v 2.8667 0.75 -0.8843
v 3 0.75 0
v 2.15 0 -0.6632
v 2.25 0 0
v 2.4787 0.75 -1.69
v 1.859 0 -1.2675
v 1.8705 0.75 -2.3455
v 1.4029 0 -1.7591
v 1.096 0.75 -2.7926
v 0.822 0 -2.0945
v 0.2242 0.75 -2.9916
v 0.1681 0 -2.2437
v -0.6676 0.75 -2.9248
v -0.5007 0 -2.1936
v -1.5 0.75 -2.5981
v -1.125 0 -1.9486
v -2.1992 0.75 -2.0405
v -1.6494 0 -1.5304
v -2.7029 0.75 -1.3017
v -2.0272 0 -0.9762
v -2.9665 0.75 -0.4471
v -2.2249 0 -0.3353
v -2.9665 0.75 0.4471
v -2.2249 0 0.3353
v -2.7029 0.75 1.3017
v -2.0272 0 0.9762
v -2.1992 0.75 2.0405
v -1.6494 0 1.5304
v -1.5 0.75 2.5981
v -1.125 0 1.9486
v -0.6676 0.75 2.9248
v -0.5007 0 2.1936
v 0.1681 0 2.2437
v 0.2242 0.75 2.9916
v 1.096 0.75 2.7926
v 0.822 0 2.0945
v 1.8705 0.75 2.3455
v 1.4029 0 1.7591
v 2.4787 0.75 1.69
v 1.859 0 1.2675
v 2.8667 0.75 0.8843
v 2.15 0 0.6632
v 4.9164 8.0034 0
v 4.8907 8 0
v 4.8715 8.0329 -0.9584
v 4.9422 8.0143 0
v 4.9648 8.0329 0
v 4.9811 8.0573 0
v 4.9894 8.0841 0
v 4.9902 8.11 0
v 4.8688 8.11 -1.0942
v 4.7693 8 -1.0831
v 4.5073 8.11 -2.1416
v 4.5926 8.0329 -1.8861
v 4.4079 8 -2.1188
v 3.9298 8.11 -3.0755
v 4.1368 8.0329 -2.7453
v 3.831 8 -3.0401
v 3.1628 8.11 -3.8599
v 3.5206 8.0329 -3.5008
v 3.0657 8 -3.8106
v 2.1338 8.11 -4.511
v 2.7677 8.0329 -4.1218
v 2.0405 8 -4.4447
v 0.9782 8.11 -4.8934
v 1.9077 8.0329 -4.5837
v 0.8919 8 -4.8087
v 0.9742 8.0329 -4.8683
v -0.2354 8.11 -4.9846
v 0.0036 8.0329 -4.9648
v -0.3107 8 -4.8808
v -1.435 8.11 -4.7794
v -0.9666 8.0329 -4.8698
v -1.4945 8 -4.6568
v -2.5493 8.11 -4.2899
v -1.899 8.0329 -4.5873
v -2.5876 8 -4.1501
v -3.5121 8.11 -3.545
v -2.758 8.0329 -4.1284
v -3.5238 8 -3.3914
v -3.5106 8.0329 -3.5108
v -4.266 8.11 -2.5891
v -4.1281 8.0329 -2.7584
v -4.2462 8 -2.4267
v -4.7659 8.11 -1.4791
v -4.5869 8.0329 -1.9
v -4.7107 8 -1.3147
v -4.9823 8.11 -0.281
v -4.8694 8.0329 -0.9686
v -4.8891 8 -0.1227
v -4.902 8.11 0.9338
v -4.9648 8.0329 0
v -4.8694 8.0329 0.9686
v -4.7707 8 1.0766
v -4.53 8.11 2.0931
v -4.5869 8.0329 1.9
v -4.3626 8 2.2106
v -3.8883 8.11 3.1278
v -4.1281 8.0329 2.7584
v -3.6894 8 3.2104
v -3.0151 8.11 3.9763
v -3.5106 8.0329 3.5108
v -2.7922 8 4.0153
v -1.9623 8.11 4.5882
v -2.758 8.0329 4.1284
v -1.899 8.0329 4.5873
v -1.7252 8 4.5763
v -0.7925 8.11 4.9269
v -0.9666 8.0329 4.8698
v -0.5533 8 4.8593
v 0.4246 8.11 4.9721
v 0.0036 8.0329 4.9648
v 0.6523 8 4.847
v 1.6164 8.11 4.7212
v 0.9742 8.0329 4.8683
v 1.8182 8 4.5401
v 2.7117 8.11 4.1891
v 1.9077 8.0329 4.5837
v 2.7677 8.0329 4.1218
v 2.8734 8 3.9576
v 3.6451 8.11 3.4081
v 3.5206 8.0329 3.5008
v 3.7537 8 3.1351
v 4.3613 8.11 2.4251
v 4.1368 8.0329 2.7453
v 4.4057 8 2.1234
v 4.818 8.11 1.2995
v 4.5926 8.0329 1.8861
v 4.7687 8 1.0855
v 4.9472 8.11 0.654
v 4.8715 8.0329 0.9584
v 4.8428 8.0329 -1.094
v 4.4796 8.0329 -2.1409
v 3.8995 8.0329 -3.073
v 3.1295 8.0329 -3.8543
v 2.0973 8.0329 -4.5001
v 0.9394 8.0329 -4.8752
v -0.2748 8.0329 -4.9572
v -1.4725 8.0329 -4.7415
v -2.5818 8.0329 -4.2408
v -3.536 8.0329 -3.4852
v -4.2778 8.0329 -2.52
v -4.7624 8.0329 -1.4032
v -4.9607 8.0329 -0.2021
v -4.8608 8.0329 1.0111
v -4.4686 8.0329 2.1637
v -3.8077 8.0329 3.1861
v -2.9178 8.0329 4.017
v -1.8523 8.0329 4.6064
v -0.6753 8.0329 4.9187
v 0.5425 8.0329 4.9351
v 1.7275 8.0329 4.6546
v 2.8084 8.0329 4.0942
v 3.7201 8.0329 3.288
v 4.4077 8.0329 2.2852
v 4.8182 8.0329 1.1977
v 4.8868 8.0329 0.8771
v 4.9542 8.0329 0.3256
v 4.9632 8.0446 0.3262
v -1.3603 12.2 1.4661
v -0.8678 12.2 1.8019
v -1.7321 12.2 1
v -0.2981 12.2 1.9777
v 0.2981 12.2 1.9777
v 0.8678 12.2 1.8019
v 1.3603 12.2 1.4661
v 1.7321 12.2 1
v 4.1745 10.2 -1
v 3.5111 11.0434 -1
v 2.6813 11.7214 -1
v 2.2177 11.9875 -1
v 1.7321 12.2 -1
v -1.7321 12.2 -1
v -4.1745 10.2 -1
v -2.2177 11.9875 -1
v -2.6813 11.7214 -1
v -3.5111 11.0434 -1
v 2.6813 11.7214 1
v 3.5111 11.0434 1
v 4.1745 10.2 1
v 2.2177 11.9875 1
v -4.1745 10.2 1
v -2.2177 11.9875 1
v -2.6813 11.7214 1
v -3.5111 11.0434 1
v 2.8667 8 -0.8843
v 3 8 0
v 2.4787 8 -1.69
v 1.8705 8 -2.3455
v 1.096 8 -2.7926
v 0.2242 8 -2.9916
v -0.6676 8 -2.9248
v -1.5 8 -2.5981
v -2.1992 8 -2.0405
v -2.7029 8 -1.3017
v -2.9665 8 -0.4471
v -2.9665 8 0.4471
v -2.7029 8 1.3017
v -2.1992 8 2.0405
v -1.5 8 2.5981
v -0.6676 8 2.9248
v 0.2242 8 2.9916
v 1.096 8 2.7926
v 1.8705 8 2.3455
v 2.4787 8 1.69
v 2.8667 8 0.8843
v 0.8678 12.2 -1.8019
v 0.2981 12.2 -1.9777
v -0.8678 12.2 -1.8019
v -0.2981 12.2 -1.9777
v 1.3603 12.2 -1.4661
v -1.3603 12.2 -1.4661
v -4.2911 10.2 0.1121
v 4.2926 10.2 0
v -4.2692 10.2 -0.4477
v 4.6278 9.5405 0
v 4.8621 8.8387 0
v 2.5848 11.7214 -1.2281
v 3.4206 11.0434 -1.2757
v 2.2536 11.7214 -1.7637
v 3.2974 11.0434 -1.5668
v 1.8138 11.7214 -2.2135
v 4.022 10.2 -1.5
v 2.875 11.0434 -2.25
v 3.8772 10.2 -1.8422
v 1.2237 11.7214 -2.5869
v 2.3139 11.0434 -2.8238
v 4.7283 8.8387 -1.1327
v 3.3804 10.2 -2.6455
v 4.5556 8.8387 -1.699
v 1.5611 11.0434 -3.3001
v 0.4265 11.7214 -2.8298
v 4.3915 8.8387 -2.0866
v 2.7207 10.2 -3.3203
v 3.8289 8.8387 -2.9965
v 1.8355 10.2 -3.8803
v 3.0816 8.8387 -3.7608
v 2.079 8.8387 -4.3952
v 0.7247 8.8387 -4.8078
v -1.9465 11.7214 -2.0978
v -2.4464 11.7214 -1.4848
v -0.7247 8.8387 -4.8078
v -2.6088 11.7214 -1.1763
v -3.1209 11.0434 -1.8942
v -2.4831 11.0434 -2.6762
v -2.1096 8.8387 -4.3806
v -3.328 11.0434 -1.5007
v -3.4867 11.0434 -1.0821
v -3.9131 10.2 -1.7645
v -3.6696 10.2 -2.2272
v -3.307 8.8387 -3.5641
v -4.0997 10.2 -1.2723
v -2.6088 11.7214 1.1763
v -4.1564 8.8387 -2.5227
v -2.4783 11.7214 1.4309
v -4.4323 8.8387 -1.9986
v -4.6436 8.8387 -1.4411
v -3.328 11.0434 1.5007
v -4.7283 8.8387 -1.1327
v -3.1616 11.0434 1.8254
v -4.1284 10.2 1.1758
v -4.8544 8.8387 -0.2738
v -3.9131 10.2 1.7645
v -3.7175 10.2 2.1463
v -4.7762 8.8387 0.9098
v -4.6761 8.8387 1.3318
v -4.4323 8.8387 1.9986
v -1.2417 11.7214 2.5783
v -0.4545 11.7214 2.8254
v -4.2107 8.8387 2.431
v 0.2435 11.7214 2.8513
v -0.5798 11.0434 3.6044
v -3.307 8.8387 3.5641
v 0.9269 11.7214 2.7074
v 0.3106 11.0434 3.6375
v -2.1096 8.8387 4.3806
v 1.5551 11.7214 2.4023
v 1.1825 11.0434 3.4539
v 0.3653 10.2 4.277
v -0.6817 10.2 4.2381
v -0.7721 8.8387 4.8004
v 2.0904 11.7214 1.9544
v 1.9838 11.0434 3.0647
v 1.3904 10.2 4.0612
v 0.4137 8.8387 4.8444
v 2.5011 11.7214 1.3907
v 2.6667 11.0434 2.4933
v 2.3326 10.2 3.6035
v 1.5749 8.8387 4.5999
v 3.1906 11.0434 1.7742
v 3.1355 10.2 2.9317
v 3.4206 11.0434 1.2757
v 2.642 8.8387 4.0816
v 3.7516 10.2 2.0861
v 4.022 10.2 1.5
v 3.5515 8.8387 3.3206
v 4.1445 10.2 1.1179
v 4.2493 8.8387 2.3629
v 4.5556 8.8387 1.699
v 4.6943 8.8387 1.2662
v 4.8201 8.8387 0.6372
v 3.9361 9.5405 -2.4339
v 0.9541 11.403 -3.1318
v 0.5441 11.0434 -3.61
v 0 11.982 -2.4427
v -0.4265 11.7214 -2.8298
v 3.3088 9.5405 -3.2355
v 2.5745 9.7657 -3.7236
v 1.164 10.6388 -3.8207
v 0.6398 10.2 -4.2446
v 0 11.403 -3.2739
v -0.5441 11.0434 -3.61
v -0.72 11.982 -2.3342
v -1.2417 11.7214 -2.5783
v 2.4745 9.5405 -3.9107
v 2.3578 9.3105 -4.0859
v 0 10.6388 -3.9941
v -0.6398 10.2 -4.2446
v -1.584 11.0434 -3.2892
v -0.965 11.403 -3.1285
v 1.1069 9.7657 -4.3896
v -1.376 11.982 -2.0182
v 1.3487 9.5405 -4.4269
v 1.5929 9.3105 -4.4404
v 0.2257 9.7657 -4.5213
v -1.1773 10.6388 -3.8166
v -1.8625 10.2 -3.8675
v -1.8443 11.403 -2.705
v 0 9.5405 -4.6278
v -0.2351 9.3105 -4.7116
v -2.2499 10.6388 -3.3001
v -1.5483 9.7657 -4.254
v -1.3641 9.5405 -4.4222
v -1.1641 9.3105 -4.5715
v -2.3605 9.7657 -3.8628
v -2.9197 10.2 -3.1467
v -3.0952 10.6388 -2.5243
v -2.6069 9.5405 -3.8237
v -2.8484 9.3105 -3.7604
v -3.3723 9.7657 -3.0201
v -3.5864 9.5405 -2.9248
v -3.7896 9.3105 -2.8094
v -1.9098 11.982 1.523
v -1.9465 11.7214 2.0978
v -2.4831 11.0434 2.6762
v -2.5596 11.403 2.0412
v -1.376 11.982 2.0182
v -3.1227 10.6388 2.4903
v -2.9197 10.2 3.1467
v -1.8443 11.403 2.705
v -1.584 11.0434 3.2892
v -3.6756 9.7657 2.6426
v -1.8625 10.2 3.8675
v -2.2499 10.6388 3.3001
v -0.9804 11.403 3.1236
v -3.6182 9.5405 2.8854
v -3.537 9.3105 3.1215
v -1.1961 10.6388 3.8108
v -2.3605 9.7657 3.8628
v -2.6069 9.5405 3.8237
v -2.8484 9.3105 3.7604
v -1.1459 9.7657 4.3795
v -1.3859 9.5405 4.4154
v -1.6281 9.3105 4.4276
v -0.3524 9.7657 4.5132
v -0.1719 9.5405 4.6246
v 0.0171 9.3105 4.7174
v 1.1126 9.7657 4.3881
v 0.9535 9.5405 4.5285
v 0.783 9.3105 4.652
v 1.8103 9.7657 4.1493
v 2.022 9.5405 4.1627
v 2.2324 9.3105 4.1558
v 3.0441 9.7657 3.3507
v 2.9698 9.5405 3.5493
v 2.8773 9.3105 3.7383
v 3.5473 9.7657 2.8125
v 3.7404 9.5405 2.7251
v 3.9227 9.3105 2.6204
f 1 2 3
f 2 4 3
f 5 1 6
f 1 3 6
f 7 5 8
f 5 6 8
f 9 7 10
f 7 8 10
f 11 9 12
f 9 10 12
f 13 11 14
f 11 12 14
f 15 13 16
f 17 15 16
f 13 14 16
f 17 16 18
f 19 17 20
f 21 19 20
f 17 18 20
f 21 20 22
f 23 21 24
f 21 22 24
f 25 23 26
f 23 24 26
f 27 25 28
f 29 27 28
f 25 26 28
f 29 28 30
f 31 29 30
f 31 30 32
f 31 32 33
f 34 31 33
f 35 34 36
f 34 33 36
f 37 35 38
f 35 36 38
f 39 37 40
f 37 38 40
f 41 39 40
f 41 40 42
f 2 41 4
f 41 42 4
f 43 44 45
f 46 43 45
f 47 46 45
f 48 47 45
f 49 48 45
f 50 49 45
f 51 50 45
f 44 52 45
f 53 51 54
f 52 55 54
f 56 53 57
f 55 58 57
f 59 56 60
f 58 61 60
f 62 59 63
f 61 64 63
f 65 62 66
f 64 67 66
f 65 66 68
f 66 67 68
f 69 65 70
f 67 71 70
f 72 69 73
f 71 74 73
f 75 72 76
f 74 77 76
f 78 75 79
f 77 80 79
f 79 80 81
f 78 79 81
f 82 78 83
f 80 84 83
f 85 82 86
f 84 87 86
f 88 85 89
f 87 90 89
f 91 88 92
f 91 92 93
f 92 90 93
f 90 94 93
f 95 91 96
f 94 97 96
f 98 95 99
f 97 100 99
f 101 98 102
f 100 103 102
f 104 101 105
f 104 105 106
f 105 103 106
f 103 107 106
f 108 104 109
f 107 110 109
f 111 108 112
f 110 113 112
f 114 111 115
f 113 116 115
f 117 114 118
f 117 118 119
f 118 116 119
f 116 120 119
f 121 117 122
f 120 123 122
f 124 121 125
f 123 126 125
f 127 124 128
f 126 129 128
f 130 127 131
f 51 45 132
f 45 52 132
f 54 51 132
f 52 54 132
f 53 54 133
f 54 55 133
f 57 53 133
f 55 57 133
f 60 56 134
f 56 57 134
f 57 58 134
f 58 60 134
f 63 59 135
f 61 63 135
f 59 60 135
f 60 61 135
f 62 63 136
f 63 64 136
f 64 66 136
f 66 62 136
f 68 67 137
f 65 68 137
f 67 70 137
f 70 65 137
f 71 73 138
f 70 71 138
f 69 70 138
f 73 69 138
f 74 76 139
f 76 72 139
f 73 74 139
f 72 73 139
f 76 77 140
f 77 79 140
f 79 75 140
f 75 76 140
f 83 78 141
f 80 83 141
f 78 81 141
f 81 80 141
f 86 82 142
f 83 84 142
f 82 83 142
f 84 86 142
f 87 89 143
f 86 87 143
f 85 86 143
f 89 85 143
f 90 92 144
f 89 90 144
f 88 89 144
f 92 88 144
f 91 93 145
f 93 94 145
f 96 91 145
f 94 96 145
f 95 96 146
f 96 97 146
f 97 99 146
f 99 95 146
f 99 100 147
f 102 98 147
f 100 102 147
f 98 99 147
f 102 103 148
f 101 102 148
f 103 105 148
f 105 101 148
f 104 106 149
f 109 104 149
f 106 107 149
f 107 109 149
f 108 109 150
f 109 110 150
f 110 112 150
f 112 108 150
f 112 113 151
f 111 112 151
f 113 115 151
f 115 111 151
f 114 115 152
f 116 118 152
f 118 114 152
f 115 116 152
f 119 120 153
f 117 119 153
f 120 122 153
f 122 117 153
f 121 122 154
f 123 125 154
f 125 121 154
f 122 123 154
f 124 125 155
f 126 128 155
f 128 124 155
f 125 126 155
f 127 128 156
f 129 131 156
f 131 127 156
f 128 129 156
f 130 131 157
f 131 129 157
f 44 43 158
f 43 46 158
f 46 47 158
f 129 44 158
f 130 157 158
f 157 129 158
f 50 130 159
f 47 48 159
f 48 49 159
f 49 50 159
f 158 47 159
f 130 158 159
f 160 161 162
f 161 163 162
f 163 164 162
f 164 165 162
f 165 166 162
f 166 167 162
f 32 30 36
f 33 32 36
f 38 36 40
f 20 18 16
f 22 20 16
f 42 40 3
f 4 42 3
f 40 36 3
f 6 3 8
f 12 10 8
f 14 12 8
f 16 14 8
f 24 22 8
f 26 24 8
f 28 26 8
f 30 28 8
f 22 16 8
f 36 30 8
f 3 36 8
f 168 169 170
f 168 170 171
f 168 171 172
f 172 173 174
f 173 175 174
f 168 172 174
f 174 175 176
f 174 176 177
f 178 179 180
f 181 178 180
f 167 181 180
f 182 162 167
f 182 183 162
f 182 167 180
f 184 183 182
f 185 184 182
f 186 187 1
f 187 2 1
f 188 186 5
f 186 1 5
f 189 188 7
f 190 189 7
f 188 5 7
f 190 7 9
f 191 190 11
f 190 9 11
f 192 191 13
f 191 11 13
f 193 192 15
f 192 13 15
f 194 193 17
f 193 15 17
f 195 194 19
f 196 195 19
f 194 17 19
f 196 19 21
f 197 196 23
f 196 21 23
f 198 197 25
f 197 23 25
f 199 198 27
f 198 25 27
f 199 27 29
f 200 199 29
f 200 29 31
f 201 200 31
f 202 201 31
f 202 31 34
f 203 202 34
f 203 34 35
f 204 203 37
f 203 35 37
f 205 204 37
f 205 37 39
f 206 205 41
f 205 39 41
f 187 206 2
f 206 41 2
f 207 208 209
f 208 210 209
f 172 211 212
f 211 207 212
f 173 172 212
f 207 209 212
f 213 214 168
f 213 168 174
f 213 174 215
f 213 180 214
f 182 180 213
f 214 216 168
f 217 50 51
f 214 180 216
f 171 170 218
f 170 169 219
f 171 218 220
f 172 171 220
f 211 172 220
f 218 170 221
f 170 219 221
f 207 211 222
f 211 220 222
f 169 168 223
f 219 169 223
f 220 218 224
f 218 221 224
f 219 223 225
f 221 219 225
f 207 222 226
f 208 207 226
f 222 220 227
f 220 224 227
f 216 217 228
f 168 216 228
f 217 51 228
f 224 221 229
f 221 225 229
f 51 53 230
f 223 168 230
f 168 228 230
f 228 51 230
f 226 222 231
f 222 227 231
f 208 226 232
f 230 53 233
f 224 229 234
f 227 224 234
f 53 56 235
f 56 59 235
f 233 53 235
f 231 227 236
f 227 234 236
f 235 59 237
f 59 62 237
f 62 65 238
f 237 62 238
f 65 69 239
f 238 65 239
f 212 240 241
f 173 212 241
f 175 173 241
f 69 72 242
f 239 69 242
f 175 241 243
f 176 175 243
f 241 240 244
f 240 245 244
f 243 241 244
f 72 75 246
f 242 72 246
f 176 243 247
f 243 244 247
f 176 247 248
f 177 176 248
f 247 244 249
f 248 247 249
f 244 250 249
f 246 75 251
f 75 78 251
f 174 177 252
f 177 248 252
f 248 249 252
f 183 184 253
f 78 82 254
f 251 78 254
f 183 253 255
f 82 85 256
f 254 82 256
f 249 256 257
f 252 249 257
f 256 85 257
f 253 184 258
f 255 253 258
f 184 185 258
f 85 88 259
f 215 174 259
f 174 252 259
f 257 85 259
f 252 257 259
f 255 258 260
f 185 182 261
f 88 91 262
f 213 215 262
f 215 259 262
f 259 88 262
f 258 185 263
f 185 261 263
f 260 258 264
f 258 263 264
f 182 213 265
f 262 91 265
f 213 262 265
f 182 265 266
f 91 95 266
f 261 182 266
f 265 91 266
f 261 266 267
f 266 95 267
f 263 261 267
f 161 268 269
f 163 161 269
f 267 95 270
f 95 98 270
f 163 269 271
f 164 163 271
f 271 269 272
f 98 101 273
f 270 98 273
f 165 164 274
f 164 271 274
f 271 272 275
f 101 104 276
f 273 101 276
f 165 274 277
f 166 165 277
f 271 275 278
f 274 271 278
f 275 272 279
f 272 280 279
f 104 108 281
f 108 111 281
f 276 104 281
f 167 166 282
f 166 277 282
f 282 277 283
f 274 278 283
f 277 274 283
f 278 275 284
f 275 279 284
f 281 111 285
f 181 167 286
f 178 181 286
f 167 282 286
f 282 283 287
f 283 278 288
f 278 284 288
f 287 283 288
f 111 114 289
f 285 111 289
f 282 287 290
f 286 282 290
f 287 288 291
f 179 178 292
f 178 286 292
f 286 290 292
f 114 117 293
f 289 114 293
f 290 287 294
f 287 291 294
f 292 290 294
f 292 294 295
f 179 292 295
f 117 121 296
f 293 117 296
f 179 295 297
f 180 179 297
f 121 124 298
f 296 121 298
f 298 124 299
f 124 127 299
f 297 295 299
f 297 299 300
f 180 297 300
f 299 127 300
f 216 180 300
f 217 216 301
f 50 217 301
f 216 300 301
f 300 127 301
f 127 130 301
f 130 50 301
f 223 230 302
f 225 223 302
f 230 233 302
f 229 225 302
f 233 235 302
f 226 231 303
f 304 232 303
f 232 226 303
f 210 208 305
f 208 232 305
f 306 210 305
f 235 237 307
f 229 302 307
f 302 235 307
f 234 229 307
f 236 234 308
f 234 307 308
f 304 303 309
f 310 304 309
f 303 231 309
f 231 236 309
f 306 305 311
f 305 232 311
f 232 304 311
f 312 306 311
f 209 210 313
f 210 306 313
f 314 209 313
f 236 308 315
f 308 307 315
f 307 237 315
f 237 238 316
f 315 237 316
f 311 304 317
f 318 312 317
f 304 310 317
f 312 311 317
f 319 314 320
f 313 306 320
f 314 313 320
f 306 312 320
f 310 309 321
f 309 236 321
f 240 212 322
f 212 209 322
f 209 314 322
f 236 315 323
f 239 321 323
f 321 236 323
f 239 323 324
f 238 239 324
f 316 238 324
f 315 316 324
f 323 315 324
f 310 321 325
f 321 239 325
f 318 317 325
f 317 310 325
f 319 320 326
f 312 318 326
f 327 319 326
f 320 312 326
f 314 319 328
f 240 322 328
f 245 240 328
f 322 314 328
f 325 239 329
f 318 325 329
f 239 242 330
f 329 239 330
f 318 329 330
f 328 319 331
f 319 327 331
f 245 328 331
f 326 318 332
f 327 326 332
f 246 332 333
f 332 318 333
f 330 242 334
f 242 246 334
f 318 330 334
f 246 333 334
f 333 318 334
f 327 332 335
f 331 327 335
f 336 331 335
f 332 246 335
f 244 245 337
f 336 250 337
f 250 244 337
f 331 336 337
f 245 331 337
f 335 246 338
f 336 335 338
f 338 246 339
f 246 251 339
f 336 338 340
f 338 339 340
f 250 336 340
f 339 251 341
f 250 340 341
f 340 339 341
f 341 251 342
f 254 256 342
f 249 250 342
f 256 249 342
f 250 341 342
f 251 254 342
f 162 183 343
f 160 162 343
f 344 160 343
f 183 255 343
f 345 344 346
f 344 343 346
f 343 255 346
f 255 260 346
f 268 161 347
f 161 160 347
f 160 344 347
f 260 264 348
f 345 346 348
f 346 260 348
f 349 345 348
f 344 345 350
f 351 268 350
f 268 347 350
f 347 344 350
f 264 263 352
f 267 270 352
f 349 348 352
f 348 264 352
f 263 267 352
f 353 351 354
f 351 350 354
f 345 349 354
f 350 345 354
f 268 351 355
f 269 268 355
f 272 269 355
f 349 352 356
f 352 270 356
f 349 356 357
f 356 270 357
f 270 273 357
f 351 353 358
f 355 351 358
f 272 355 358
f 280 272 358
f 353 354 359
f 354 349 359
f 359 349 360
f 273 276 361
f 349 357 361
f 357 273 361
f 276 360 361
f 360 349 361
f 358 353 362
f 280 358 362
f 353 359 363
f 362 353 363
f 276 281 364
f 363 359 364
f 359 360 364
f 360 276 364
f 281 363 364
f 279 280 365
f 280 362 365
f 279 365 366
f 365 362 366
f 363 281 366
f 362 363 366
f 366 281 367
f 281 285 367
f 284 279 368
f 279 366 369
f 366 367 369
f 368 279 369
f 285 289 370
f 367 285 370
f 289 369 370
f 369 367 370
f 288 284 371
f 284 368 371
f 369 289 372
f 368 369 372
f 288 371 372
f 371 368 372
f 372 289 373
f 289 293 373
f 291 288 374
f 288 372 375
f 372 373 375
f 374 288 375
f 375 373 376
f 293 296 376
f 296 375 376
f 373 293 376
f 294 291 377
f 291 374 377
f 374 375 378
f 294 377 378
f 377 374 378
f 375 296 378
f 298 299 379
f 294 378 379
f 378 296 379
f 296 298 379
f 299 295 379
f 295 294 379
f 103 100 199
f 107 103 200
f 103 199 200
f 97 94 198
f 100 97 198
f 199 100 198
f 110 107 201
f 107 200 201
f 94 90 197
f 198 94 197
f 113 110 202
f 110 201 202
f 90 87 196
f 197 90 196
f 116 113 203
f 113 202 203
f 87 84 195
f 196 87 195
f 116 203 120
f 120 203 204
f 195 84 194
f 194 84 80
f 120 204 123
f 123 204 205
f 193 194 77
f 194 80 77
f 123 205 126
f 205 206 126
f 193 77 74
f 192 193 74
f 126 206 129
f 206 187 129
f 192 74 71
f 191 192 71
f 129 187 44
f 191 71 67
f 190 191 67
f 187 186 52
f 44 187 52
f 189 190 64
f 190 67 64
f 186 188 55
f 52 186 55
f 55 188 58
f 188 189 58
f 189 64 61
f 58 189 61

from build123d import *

# Parameters (mm, degrees)
FILLET_1_R          = 0.1
SKETCH_3_W          = 10
SKETCH_3_H          = 2
CUT_EXTRUDE_2_DEPTH = 2


with BuildPart() as part:
    # Эскиз1 → Повернуть1 (revolve)
    with BuildSketch(Plane.XY):
        with BuildLine():
            Line((5, 8), (3, 8))
            Line((3, 8), (3, 0.75))
            Line((3, 0.75), (2.25, 0))
            Line((2.25, 0), (0, 0))
            Line((0, 0), (0, 12.2))
            Line((0, 12.2), (2, 12.2))
            ThreePointArc((2, 12.2), (4.083835358, 10.517025256), (5, 8))
        make_face()
    revolve(axis=Axis((0, 0, 0), (0, 1, 0)))

    # Скругление1
    fillet_1_edges = [part.edges().sort_by_distance(p)[0] for p in [
        (-5, 8, 0),
    ]]
    fillet(fillet_1_edges, radius=FILLET_1_R)

    # Эскиз3 → Вырез-Вытянуть2 (cut)
    with BuildSketch(Plane(origin=(0, 12.2, 0), x_dir=(-1, 0, 0), z_dir=(0, 1, 0))):
        Rectangle(SKETCH_3_W, SKETCH_3_H)
    extrude(amount=-CUT_EXTRUDE_2_DEPTH, mode=Mode.SUBTRACT)


solid = part.part
